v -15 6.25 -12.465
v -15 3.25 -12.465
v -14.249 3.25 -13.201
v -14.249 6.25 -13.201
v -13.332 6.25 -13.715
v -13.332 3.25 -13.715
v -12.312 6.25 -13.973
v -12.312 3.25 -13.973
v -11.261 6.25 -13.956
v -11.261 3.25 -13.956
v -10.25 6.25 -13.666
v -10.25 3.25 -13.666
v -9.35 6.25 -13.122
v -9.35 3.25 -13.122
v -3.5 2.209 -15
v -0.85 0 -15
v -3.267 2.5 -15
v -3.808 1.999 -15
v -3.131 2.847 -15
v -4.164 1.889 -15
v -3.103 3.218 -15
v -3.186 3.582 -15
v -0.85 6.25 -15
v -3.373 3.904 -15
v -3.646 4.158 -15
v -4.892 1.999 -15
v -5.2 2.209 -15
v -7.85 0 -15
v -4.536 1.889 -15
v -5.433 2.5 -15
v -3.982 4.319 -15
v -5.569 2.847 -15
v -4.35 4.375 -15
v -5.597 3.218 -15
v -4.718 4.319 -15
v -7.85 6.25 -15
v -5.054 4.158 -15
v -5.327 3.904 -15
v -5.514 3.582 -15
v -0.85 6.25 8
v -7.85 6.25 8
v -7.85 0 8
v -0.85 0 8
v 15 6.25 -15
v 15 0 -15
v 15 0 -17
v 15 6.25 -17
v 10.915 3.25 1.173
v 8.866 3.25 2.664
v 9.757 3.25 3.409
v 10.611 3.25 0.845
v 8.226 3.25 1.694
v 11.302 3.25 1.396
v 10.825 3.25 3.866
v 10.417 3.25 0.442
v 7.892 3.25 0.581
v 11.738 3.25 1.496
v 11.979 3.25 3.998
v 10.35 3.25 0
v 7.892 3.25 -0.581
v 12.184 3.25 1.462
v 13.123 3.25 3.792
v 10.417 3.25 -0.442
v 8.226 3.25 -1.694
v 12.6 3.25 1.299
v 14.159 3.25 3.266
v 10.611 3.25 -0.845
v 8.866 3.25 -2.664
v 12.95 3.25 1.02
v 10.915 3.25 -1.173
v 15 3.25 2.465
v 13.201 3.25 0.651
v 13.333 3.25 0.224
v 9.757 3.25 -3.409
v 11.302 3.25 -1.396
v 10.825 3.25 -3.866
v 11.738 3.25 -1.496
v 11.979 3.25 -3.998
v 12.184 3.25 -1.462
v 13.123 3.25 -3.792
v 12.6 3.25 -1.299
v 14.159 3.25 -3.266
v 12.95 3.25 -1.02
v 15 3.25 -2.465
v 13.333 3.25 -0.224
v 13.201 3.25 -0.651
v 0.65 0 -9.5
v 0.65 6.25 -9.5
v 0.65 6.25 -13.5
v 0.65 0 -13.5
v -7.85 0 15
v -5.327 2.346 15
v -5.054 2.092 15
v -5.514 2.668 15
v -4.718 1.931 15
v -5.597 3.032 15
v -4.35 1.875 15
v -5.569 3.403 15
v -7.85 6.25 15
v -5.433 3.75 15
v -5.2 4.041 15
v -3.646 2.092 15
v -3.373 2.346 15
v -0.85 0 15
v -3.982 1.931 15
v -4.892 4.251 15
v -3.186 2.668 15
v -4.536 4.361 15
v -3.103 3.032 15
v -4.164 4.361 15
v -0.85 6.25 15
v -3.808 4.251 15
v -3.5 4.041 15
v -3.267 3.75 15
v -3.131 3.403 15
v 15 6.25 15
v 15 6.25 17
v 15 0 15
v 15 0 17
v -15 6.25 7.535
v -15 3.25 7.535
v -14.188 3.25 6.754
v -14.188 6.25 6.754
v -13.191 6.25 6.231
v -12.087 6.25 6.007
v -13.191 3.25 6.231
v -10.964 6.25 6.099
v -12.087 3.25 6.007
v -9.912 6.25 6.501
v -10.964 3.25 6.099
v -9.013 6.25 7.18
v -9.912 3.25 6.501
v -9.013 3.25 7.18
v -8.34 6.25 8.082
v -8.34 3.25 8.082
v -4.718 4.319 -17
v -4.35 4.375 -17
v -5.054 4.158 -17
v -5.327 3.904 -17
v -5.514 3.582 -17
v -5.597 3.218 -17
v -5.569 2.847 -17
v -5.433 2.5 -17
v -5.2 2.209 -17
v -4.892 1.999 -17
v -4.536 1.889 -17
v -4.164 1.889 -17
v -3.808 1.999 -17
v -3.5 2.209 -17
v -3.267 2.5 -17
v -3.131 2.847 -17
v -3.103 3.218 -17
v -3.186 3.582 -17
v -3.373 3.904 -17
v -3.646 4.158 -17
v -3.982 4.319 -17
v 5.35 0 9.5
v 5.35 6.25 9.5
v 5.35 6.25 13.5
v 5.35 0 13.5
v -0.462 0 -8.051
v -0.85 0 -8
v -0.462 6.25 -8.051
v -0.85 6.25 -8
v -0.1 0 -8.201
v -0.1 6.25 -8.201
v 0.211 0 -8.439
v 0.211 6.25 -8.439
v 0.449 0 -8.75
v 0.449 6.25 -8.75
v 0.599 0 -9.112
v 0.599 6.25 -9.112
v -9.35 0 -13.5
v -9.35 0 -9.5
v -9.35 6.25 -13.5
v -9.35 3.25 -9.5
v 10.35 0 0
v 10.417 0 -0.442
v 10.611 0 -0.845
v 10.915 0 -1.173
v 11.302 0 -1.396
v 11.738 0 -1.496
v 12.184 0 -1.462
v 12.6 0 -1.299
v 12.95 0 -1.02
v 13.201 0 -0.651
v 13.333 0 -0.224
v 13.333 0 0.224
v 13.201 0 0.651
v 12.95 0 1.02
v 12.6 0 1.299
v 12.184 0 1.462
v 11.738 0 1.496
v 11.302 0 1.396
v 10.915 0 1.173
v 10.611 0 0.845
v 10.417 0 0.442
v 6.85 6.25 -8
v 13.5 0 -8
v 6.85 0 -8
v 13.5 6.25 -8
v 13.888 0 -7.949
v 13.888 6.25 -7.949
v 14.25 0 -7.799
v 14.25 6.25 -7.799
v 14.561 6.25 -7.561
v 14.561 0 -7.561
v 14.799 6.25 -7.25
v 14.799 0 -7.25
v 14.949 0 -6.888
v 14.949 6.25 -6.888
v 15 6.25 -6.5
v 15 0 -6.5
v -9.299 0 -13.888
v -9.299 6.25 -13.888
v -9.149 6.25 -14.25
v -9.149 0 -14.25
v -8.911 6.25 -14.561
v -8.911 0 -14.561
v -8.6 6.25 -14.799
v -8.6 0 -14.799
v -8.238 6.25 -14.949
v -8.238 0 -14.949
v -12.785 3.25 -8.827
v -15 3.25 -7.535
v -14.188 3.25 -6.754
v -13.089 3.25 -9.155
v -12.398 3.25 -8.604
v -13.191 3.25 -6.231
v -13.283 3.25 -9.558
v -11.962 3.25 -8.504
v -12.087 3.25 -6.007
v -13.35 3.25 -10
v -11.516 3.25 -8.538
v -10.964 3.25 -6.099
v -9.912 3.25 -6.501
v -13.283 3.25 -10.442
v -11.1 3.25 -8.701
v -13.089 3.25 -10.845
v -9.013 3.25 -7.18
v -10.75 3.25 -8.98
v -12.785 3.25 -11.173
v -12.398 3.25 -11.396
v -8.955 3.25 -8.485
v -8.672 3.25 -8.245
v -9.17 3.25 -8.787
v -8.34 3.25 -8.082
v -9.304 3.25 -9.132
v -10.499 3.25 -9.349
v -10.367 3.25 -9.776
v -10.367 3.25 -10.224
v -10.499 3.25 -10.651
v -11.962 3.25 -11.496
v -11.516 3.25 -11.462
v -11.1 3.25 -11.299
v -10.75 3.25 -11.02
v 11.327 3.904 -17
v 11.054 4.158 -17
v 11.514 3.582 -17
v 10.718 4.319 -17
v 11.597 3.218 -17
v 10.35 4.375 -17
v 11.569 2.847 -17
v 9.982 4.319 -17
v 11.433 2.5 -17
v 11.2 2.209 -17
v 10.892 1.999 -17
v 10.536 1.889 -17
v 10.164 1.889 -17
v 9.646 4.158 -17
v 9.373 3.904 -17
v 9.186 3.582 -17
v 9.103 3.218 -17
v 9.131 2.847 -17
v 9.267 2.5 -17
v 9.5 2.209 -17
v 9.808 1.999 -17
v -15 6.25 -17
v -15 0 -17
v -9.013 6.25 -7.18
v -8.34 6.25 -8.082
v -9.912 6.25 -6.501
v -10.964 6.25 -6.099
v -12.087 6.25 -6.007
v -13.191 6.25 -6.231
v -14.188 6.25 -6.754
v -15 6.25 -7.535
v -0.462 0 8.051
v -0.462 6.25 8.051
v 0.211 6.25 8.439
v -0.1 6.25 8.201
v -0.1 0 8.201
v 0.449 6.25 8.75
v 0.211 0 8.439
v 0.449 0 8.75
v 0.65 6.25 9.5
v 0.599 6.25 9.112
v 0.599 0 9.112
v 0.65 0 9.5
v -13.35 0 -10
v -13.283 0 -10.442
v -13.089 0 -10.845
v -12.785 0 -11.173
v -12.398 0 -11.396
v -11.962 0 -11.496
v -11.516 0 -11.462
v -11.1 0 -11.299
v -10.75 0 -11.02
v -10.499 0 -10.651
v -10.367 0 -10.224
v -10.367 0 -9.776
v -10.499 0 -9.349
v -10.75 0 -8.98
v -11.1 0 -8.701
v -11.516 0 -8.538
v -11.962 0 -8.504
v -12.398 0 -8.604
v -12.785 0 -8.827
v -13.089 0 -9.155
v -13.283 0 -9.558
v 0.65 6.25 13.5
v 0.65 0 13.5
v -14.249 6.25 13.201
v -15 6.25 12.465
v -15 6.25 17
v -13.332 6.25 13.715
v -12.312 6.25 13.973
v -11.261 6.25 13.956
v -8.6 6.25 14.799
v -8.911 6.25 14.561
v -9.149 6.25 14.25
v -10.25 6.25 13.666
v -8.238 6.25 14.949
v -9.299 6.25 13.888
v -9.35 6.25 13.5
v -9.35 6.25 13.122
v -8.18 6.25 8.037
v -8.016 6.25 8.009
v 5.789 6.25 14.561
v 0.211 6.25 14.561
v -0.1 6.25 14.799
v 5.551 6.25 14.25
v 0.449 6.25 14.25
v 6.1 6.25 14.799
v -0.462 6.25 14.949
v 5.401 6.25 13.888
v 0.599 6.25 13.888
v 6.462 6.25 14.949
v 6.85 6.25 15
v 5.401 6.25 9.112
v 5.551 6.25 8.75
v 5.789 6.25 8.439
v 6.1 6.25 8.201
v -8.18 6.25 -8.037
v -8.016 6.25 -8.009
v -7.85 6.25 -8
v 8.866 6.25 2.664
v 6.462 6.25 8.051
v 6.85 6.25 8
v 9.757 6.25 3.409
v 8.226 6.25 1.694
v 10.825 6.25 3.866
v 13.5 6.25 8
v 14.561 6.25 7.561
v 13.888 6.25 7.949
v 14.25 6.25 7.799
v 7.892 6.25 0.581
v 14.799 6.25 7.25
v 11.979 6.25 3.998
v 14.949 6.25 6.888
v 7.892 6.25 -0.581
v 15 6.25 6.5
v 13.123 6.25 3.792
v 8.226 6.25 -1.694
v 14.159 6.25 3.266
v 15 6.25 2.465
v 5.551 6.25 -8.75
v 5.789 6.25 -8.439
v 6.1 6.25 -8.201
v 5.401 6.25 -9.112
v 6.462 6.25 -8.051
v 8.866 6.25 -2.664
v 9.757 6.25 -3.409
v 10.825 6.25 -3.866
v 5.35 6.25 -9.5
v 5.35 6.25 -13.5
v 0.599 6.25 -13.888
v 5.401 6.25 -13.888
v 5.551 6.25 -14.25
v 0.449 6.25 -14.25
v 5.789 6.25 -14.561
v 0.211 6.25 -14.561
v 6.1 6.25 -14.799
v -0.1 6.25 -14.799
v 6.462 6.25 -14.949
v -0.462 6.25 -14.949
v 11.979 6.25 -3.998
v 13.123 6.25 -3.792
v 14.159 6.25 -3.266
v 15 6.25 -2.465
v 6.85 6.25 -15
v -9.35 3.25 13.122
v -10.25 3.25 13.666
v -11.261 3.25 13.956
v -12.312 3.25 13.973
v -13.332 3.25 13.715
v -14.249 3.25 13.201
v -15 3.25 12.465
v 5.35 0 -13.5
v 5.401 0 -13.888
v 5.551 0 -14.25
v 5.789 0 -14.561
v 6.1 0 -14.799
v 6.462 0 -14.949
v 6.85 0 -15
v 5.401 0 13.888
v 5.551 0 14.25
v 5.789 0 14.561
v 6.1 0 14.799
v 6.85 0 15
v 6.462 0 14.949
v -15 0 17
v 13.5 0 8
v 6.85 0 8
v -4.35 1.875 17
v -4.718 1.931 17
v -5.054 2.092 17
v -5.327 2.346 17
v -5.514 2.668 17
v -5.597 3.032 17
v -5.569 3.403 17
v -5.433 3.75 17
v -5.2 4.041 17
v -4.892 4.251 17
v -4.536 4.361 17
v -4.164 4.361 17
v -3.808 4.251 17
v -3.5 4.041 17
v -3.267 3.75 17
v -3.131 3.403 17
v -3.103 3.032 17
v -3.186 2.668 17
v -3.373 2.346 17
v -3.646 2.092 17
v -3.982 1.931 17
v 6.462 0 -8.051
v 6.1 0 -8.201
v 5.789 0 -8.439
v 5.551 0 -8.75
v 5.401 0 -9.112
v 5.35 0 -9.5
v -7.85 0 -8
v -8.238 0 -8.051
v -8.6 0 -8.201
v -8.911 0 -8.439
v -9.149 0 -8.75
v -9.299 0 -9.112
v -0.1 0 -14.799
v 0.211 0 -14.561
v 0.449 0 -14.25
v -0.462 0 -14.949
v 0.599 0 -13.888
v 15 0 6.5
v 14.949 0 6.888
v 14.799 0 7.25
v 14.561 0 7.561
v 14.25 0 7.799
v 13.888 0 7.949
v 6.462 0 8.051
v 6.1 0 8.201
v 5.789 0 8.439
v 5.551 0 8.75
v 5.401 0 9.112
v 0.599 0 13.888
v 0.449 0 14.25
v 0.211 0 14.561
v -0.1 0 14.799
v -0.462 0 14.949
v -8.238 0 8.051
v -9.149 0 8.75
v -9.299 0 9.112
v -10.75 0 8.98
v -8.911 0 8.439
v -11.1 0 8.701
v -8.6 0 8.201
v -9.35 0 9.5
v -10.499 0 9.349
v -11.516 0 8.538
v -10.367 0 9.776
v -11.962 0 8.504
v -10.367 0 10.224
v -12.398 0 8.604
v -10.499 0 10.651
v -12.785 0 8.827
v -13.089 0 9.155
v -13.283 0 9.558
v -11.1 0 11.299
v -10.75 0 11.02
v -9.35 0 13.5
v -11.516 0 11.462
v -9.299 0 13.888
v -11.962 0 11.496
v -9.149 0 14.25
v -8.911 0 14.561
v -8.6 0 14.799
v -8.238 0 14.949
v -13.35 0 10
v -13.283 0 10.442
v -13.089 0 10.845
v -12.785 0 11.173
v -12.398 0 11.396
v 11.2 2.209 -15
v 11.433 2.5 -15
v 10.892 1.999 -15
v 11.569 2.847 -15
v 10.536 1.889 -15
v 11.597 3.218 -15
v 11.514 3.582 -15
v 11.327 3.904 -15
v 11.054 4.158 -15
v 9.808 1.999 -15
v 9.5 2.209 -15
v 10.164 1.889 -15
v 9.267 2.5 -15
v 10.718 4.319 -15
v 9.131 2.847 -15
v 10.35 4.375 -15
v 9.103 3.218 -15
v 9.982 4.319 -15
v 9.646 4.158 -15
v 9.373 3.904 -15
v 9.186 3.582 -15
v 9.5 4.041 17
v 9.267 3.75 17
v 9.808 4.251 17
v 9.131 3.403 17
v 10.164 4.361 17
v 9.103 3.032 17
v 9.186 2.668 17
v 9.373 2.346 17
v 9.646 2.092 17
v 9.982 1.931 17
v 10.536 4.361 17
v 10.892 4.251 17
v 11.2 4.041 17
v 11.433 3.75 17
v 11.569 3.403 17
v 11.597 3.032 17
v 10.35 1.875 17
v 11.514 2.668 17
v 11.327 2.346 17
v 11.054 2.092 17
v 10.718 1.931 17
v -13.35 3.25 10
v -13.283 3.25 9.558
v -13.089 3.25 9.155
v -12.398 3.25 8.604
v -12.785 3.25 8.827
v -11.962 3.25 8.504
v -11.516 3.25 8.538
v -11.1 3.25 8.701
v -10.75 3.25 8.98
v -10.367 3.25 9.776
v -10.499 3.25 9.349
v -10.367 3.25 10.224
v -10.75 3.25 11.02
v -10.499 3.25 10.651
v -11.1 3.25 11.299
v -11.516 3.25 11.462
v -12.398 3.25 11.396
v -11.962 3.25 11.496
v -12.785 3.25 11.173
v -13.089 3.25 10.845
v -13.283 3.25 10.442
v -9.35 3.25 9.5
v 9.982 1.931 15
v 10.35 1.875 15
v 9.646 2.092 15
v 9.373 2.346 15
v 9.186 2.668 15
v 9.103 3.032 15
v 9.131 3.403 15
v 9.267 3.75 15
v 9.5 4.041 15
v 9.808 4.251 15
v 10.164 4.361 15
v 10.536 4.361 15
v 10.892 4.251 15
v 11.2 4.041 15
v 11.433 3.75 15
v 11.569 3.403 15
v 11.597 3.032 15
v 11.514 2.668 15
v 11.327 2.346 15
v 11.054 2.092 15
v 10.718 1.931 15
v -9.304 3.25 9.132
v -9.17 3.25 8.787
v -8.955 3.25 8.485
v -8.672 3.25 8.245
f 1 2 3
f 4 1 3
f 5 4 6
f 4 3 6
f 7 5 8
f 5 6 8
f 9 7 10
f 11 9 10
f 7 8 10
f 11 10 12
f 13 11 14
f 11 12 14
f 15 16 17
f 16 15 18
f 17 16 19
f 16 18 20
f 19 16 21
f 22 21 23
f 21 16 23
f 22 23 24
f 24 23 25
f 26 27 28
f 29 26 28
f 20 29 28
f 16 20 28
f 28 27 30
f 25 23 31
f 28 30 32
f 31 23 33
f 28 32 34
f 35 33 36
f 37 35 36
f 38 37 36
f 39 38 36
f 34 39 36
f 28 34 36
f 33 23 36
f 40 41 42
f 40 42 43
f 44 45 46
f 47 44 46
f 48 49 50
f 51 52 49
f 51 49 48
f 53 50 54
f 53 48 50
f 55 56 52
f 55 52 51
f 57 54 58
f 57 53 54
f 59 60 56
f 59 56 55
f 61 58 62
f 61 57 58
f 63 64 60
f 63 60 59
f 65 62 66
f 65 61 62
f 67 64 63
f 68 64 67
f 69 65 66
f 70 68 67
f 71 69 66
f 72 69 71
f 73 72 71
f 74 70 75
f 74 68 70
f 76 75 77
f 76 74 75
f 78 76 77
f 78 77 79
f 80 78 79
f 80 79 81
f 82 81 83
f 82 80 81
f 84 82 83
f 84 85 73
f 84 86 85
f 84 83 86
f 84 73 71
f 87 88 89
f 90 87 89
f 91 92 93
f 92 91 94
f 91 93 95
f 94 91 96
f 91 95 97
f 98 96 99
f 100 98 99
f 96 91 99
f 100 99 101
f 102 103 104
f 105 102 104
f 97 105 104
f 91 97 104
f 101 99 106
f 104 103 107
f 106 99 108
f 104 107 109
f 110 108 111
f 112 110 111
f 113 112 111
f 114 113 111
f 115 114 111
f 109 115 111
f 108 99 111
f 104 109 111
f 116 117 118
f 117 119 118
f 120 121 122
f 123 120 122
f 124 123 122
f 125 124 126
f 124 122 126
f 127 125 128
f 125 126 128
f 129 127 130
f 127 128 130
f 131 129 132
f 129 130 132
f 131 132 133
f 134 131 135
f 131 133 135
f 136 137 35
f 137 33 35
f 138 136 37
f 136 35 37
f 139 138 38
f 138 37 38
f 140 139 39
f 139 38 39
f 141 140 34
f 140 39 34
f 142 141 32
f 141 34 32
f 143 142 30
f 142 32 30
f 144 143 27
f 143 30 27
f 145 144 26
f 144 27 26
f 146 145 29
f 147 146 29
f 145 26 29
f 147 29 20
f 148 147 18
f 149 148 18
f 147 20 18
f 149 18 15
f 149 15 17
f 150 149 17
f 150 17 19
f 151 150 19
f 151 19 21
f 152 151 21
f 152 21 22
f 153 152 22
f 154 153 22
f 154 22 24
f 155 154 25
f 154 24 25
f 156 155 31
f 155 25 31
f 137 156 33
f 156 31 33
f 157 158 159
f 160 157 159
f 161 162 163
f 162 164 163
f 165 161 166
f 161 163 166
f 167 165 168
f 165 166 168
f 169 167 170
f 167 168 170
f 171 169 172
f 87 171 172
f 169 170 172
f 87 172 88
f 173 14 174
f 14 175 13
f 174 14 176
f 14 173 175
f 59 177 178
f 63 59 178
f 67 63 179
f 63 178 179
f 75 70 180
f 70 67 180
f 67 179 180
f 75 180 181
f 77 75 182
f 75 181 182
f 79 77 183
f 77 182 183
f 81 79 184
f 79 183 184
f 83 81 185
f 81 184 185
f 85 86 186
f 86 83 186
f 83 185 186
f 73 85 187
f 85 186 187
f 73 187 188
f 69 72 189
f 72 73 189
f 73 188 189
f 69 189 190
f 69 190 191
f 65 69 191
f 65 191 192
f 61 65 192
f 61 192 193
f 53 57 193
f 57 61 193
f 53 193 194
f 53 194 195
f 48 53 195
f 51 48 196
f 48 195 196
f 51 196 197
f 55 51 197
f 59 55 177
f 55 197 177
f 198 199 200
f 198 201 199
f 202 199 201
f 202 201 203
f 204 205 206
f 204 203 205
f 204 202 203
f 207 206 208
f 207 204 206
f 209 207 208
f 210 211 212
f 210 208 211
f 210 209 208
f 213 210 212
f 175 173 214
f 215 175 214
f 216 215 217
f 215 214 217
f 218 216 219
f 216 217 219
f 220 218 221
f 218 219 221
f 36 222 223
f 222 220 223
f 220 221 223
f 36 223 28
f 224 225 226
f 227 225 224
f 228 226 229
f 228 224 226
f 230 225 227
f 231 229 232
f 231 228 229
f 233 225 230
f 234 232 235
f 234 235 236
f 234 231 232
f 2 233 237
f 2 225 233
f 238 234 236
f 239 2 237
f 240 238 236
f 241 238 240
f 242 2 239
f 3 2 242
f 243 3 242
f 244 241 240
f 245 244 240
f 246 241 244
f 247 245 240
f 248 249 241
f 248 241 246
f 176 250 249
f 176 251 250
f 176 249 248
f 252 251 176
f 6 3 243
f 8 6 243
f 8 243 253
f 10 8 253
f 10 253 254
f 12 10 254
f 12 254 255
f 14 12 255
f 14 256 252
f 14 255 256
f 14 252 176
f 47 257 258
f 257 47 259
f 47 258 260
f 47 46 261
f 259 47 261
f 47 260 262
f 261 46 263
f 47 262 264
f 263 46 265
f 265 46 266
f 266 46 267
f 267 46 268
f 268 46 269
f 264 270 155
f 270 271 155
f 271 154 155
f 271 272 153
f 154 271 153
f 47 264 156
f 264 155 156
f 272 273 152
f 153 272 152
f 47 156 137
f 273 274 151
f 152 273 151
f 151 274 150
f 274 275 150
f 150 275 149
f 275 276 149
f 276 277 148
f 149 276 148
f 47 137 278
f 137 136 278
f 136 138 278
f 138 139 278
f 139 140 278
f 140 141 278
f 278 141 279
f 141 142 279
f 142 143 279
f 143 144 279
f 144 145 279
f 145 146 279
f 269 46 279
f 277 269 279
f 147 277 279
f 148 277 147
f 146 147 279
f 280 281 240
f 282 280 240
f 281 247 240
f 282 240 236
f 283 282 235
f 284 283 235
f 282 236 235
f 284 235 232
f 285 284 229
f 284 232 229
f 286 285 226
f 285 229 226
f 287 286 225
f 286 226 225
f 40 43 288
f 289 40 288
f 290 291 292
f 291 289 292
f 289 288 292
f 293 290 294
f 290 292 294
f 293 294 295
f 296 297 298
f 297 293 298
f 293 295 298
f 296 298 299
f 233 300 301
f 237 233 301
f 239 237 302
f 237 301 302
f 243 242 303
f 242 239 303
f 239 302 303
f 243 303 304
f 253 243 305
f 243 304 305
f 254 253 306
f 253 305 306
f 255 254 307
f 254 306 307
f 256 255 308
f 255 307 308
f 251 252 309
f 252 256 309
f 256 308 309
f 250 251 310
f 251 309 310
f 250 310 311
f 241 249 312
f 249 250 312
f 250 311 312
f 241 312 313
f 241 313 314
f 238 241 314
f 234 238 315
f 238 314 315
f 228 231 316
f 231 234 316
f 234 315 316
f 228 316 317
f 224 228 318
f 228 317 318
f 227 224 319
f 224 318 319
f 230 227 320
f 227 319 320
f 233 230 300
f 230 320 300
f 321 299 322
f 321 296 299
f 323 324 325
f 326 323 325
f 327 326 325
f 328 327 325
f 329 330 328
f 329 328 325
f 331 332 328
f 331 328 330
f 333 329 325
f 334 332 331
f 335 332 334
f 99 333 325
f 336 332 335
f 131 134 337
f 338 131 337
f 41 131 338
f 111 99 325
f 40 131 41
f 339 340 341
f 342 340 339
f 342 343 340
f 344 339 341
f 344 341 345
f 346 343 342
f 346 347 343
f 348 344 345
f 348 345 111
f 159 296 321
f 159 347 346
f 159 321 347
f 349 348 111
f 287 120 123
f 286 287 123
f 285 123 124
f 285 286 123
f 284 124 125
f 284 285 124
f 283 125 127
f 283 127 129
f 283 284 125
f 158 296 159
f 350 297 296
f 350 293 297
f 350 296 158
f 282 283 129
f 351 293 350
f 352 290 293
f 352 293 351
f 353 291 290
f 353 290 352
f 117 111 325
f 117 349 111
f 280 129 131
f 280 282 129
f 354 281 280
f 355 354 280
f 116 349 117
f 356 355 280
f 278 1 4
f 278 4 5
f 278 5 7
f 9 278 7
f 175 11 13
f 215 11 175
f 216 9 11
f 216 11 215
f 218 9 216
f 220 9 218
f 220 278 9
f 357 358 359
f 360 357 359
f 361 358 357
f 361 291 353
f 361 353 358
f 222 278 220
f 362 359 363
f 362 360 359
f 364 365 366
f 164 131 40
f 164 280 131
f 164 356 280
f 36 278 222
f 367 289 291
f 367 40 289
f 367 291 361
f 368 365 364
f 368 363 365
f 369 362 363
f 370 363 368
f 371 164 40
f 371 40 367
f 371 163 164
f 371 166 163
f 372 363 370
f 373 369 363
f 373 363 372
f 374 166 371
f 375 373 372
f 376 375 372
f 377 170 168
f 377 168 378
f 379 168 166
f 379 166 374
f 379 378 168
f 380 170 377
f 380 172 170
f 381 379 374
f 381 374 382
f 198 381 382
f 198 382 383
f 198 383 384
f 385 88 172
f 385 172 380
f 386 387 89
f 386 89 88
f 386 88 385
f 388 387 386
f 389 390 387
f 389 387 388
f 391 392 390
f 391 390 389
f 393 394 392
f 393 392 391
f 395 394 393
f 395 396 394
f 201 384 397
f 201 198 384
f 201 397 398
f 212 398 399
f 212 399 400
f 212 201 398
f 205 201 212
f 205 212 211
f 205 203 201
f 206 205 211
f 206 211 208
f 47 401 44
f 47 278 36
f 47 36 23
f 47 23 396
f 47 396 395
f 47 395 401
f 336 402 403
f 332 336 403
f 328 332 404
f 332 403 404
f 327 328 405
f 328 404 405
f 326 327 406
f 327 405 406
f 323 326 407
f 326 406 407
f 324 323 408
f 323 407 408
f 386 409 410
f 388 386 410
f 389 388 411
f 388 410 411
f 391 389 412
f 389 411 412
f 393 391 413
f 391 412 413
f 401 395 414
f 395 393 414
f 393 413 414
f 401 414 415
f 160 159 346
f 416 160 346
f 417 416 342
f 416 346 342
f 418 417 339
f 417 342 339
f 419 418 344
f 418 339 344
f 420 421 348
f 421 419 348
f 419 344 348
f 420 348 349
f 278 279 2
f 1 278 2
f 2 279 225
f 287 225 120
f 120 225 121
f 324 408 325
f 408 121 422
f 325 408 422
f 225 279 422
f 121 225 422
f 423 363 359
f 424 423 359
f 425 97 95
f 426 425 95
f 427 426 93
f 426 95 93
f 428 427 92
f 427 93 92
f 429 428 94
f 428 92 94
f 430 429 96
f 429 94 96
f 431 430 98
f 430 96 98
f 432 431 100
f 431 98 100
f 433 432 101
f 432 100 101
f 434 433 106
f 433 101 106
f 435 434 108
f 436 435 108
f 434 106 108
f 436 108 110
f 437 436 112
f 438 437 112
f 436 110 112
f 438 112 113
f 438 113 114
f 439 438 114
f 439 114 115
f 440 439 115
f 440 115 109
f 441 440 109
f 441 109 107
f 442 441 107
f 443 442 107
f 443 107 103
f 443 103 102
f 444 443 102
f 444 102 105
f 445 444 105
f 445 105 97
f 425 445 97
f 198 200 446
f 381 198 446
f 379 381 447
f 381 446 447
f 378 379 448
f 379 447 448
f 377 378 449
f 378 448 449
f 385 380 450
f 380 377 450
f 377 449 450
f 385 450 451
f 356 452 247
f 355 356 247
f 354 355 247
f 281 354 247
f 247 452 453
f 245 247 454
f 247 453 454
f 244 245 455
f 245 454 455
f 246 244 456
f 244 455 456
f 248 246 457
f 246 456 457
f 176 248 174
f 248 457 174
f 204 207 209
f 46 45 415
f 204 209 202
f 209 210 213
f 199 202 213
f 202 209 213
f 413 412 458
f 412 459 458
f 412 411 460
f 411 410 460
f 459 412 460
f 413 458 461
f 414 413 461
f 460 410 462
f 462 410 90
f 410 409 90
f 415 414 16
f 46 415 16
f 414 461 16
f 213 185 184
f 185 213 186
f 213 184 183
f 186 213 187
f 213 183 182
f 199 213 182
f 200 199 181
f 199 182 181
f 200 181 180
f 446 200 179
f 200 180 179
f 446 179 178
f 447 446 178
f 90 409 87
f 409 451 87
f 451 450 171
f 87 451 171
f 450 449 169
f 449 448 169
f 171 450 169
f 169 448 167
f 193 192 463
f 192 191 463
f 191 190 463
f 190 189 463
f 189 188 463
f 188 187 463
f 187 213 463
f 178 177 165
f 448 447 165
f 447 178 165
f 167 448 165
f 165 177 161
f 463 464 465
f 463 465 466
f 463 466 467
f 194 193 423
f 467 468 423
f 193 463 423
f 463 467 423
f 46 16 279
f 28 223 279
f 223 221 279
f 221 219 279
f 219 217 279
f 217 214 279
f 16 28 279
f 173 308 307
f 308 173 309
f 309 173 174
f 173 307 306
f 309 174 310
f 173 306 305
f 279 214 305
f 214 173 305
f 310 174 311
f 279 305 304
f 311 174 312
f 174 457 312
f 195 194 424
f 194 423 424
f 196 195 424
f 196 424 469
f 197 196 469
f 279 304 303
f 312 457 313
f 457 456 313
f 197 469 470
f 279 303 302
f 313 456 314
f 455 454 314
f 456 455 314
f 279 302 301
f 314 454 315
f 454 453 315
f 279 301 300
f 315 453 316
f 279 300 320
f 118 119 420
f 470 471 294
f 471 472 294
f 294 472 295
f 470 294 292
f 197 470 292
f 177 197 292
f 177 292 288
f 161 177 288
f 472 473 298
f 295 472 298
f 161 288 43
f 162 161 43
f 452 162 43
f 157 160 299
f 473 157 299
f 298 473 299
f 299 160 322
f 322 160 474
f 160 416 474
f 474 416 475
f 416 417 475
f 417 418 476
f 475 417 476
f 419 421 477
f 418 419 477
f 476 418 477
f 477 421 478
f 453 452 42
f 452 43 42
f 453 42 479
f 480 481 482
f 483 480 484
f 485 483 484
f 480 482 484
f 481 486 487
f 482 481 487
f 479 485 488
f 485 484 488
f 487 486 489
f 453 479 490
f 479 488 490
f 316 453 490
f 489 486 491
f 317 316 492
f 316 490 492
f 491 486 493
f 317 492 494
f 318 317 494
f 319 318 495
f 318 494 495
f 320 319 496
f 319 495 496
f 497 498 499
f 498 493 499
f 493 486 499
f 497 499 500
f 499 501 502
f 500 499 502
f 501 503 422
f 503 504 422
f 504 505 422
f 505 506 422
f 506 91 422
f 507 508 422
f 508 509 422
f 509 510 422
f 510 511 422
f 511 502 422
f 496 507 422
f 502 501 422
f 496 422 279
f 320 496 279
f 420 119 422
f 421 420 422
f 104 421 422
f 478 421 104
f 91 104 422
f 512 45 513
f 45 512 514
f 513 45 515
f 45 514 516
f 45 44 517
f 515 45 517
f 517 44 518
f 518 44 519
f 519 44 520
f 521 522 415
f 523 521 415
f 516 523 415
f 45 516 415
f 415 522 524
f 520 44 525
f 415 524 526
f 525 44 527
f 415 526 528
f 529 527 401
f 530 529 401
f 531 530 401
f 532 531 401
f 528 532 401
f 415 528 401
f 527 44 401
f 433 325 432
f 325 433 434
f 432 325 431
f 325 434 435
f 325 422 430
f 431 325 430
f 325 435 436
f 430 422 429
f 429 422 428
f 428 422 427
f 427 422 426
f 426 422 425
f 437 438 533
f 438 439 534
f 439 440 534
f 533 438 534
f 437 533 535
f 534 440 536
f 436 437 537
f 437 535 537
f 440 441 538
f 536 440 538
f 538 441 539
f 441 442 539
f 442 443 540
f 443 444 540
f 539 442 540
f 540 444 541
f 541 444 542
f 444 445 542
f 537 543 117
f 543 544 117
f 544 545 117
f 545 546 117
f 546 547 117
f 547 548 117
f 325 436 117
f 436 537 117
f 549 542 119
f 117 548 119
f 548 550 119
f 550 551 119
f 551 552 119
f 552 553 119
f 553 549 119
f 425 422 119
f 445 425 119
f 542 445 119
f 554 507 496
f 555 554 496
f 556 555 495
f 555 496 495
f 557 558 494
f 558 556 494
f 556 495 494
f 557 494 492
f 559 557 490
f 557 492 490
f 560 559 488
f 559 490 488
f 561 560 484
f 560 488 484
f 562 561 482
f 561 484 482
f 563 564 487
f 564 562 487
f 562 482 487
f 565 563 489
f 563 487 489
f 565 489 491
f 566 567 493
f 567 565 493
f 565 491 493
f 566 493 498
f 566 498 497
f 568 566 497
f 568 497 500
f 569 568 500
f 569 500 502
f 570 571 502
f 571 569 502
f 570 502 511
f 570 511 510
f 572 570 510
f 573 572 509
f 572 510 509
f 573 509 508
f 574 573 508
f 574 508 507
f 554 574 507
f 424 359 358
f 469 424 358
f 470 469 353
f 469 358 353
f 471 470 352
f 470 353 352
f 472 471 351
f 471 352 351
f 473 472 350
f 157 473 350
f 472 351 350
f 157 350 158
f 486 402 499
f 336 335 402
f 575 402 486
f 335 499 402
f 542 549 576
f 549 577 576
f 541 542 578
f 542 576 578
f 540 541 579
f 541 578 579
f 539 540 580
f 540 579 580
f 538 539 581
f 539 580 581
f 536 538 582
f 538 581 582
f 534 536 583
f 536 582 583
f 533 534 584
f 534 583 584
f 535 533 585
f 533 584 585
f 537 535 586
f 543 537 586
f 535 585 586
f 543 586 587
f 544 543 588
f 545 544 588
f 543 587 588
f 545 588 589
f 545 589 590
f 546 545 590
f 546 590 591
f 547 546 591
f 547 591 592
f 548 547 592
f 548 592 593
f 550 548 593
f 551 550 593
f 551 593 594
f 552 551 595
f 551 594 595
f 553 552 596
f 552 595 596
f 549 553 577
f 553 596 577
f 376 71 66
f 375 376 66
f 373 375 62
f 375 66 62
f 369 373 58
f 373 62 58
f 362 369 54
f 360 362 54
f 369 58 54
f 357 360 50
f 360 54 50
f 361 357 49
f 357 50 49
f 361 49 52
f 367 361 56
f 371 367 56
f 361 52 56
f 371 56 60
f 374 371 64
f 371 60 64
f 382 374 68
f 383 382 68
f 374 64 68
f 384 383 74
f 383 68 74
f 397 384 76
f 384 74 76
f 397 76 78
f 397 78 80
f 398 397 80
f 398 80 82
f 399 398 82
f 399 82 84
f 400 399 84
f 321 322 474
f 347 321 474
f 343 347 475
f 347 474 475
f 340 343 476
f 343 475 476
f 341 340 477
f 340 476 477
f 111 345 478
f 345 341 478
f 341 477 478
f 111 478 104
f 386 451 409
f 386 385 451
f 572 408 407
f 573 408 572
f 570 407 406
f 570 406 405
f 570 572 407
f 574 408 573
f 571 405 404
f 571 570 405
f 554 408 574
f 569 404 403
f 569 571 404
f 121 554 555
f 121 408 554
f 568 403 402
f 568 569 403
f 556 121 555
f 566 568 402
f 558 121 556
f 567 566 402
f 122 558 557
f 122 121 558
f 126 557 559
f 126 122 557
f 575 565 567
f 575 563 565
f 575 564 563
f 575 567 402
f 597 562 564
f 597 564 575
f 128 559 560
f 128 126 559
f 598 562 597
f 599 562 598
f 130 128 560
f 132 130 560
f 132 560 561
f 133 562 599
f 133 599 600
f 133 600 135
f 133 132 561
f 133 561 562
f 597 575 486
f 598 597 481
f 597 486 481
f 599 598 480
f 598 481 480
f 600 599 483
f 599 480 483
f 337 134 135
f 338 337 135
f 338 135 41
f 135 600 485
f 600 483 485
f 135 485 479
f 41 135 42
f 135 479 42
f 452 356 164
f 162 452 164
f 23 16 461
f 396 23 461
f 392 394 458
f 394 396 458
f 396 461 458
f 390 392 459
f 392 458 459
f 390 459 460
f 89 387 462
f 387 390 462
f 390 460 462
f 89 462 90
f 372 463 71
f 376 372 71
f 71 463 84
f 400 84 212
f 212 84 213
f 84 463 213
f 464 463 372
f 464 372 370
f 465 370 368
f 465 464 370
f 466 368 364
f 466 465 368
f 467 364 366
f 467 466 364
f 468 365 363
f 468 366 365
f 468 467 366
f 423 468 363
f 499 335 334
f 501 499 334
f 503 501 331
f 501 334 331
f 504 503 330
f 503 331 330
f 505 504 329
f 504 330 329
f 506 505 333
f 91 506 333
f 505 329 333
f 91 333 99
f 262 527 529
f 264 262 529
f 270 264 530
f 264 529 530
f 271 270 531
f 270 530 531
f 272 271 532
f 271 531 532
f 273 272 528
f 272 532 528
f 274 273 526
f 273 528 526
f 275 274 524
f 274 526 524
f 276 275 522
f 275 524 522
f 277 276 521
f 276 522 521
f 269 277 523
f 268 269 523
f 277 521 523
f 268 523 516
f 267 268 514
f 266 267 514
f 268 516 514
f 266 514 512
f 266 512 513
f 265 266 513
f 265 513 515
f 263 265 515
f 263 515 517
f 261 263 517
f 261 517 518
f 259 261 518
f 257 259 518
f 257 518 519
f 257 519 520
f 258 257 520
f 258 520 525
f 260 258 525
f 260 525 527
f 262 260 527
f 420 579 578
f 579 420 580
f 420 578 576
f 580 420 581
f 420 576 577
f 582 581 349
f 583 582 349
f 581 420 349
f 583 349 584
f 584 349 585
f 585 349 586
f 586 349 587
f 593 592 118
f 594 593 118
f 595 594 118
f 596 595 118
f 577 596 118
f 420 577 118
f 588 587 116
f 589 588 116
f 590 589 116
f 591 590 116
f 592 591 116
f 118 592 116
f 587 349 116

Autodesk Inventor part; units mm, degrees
ref_plane "YZ Plane" through (0, 0, 0) normal (1, 0, 0) x (0, 1, 0)
ref_plane "XZ Plane" through (0, 0, 0) normal (0, 1, 0) x (-1, 0, 0)
sketch "Sketch1" plane through (0, 0, 0) normal (0, 1, 0) x (-1, 0, 0)
  line L0 (-15, -17) -> (15, -17)
  line L1 (15, -17) -> (15, 17)
  line L2 (15, 17) -> (-15, 17)
  line L3 (-15, 17) -> (-15, -17)
  line L4 (-15, -17) -> (15, 17) construction
  line L5 (15, -17) -> (-15, 17) construction
  line L6 (-21, 0) -> (21, 0) construction
  line L7 (15, 10) -> (-15, 10) construction
  line L8 (11.85, 17) -> (11.85, -17) construction
  line L9 (0, -23.8) -> (0, 23.8) construction
  line L10 (-11.85, 17) -> (-11.85, -17) construction
  line L11 (15, -10) -> (-15, -10) construction
  circle A0 centre (11.85, 10) radius 1.5
  circle A1 centre (11.85, -10) radius 1.5
  circle A2 centre (-11.85, 0) radius 1.5
  point P0 (0, 0)
  dimension "d0" = 34
  dimension "d1" = 30
  dimension "d2" = 10
  dimension "d3" = 11.85
  dimension "d4" = 3
  dimension "d5" = 3
  dimension "d6" = 3
extrude "Extrusion1" add sketch "Sketch1" along normal blind 3.25
sketch "Sketch2" plane through (0, 3.25, 0) normal (0, 1, 0) x (1, 0, 0)
  line L0 (15, 17) -> (-15, 17) projected
  line L1 (15, -17) -> (15, 17) projected
  line L2 (-15, 17) -> (15, 17)
  line L3 (15, 17) -> (15, 15)
  line L4 (15, 15) -> (-15, 15)
  line L5 (-15, 15) -> (-15, 17)
  line L6 (21, 0) -> (-21, 0) construction
  line L7 (15, -17) -> (-15, -17)
  line L8 (15, 17) -> (15, -17)
  line L9 (15, -15) -> (-15, -15)
  line L10 (-15, -15) -> (-15, -17)
  point P0 (0, 0)
  dimension "d9" = 2
extrude "Extrusion2" add sketch "Sketch2" along normal blind 3
sketch "Sketch5" plane through (15, 0, -17) normal (0, 0, -1) x (-1, 0, 0)
  line L0 (0, 0) -> (30, 0) projected
  line L1 (30, 0) -> (30, 6.25) projected
  line L2 (0, 6.25) -> (30, 6.25) projected
  line L3 (0, 0) -> (0, 6.25) projected
  line L4 (0, 3.125) -> (4.65, 3.125) construction
  line L5 (4.65, 3.125) -> (19.35, 3.125) construction
  dimension "d40" = 4.65
  dimension "d41" = 14.7
sketch "Sketch8" plane through (0, 3.25, 0) normal (0, 1, 0) x (1, 0, 0)
  line L0 (15, 15) -> (-15, 15) projected
  line L1 (-15, 15) -> (-15, -15) projected
  line L2 (-15, -15) -> (15, -15) projected
  line L3 (15, -15) -> (15, 15) projected
  circle A0 centre (-11.85, -10) radius 1.5 projected
  circle A1 centre (-11.85, 10) radius 1.5 projected
  circle A2 centre (11.85, 0) radius 1.5 projected
  line L4 (-9.35, -15) -> (-9.35, -8)
  line L5 (-9.35, -8) -> (0.65, -8)
  line L6 (0.65, -8) -> (0.65, -15)
  line L7 (15, -8) -> (5.35, -8)
  line L8 (5.35, -8) -> (5.35, -15)
  line L9 (15, -8) -> (15, -15)
  line L10 (15, -17) -> (15, 17) projected
  line L11 (15, -15) -> (5.35, -15)
  line L12 (0.65, -15) -> (-9.35, -15)
  line L13 (15, 0) -> (-15, 0) construction
  line L14 (-15, 17) -> (-15, -17) construction
  line L15 (-15, 15) -> (15, 15)
  line L16 (15, 15) -> (15, -15)
  line L17 (-9.35, 15) -> (-9.35, 8)
  line L18 (-9.35, 8) -> (0.65, 8)
  line L19 (0.65, 8) -> (0.65, 15)
  line L20 (15, 8) -> (5.35, 8)
  line L21 (5.35, 8) -> (5.35, 15)
  line L22 (15, 8) -> (15, 15)
  line L23 (15, 17) -> (15, -17)
  line L24 (15, 15) -> (5.35, 15)
  line L25 (0.65, 15) -> (-9.35, 15)
  circle A3 centre (11.85, 0) radius 4
  circle A4 centre (-11.85, 10) radius 4
  circle A5 centre (-11.85, -10) radius 4
  point P0 (0, 0)
  dimension "d34" = 9.65
  dimension "d35" = 4.7
  dimension "d36" = 10
  dimension "d37" = 8
  dimension "d44" = 8
extrude "Extrusion5" cut sketch "Sketch8" against normal through all contours L3 L20 L21 L0 | L19 L18 A4 L17 L0 | A4 L18 L17 | L3 L2 L8 L7 | A5 L4 L5 | L5 L6 L2 L4 A5
hole "Hole1" at (-4.35, 3.125, -17) at (10.35, 3.125, -17) direction (0, 0, 1) diameter 2.5 end up to surface
ref_plane "Work Plane1" through (15, 0, 0) normal (0, 0, -1) x (-1, 0, 0)
mirror "Mirror1" about plane through (15, 0, 0) normal (0, 0, -1) of "Hole1"
extrude "Extrusion6" add sketch "Sketch8" along normal blind 3 contours L21 L20 L3 A3 L7 L8 L2 L6 L5 A5 L1 A4 L18 L19 L0 | L3 A3 | L17 A4 L1 L0 | L17 L18 A4 L1 | A5 L5 L4 L1 | A5 L4 L2 L1 picked at (14.45, 0)
extrude "Extrusion7" cut sketch "Sketch8" along normal through all contours A3 L3 | L3 A3 | A4 L18 L17 | L17 L18 A4 L1 | L1 A4 | A5 L5 L4 L1 | L1 A5 | A5 L4 L5
fillet "Fillet3" radius 1.5 12 edges at (-9.35, 3.125, 15) (0.65, 3.125, -8) (-9.35, 1.625, -8) (5.35, 3.125, -8) (5.35, 3.125, 8) (-9.35, 1.625, 8) (0.65, 3.125, 8) (-9.35, 3.125, -15) (0.65, 3.125, -15) (5.35, 3.125, -15) (5.35, 3.125, 15) (0.65, 3.125, 15)
fillet "Fillet4" radius 1.5 2 edges at (15, 3.125, 8) (15, 3.125, -8)
equation "\"d0\" = fix_width"
equation "\"d1\" = fix_length"
equation "\"d7\" = first_layer_thickness"
equation "\"d10\" = thickness - first_layer_thickness"
equation "\"d40\" = side_fix_2_back"
equation "\"d41\" = side_fix_spacing"
equation "\"d34\" = side_fix_2_back + side_fix_clearance"
equation "\"d35\" = side_fix_spacing - 2 * side_fix_clearance"
equation "\"d36\" = 2 * side_fix_clearance"
equation "\"d37\" = cam_fix_clearance"
equation "\"d45\" = thickness - first_layer_thickness"
equation "\"d47\" = thickness - first_layer_thickness"
equation "\"fix_width\" = 34"
equation "\"side_fix_2_back\" = 4.65"
equation "\"side_fix_spacing\" = 14.7"
equation "\"side_fix_clearance\" = 5"
equation "\"cam_fix_clearance\" = 8"
equation "\"fix_length\" = 30"
equation "\"thickness\" = 6.25"
equation "\"first_layer_thickness\" = 3.25"
properties part number "ptgrey_fix2" material "Aluminum 6061"
